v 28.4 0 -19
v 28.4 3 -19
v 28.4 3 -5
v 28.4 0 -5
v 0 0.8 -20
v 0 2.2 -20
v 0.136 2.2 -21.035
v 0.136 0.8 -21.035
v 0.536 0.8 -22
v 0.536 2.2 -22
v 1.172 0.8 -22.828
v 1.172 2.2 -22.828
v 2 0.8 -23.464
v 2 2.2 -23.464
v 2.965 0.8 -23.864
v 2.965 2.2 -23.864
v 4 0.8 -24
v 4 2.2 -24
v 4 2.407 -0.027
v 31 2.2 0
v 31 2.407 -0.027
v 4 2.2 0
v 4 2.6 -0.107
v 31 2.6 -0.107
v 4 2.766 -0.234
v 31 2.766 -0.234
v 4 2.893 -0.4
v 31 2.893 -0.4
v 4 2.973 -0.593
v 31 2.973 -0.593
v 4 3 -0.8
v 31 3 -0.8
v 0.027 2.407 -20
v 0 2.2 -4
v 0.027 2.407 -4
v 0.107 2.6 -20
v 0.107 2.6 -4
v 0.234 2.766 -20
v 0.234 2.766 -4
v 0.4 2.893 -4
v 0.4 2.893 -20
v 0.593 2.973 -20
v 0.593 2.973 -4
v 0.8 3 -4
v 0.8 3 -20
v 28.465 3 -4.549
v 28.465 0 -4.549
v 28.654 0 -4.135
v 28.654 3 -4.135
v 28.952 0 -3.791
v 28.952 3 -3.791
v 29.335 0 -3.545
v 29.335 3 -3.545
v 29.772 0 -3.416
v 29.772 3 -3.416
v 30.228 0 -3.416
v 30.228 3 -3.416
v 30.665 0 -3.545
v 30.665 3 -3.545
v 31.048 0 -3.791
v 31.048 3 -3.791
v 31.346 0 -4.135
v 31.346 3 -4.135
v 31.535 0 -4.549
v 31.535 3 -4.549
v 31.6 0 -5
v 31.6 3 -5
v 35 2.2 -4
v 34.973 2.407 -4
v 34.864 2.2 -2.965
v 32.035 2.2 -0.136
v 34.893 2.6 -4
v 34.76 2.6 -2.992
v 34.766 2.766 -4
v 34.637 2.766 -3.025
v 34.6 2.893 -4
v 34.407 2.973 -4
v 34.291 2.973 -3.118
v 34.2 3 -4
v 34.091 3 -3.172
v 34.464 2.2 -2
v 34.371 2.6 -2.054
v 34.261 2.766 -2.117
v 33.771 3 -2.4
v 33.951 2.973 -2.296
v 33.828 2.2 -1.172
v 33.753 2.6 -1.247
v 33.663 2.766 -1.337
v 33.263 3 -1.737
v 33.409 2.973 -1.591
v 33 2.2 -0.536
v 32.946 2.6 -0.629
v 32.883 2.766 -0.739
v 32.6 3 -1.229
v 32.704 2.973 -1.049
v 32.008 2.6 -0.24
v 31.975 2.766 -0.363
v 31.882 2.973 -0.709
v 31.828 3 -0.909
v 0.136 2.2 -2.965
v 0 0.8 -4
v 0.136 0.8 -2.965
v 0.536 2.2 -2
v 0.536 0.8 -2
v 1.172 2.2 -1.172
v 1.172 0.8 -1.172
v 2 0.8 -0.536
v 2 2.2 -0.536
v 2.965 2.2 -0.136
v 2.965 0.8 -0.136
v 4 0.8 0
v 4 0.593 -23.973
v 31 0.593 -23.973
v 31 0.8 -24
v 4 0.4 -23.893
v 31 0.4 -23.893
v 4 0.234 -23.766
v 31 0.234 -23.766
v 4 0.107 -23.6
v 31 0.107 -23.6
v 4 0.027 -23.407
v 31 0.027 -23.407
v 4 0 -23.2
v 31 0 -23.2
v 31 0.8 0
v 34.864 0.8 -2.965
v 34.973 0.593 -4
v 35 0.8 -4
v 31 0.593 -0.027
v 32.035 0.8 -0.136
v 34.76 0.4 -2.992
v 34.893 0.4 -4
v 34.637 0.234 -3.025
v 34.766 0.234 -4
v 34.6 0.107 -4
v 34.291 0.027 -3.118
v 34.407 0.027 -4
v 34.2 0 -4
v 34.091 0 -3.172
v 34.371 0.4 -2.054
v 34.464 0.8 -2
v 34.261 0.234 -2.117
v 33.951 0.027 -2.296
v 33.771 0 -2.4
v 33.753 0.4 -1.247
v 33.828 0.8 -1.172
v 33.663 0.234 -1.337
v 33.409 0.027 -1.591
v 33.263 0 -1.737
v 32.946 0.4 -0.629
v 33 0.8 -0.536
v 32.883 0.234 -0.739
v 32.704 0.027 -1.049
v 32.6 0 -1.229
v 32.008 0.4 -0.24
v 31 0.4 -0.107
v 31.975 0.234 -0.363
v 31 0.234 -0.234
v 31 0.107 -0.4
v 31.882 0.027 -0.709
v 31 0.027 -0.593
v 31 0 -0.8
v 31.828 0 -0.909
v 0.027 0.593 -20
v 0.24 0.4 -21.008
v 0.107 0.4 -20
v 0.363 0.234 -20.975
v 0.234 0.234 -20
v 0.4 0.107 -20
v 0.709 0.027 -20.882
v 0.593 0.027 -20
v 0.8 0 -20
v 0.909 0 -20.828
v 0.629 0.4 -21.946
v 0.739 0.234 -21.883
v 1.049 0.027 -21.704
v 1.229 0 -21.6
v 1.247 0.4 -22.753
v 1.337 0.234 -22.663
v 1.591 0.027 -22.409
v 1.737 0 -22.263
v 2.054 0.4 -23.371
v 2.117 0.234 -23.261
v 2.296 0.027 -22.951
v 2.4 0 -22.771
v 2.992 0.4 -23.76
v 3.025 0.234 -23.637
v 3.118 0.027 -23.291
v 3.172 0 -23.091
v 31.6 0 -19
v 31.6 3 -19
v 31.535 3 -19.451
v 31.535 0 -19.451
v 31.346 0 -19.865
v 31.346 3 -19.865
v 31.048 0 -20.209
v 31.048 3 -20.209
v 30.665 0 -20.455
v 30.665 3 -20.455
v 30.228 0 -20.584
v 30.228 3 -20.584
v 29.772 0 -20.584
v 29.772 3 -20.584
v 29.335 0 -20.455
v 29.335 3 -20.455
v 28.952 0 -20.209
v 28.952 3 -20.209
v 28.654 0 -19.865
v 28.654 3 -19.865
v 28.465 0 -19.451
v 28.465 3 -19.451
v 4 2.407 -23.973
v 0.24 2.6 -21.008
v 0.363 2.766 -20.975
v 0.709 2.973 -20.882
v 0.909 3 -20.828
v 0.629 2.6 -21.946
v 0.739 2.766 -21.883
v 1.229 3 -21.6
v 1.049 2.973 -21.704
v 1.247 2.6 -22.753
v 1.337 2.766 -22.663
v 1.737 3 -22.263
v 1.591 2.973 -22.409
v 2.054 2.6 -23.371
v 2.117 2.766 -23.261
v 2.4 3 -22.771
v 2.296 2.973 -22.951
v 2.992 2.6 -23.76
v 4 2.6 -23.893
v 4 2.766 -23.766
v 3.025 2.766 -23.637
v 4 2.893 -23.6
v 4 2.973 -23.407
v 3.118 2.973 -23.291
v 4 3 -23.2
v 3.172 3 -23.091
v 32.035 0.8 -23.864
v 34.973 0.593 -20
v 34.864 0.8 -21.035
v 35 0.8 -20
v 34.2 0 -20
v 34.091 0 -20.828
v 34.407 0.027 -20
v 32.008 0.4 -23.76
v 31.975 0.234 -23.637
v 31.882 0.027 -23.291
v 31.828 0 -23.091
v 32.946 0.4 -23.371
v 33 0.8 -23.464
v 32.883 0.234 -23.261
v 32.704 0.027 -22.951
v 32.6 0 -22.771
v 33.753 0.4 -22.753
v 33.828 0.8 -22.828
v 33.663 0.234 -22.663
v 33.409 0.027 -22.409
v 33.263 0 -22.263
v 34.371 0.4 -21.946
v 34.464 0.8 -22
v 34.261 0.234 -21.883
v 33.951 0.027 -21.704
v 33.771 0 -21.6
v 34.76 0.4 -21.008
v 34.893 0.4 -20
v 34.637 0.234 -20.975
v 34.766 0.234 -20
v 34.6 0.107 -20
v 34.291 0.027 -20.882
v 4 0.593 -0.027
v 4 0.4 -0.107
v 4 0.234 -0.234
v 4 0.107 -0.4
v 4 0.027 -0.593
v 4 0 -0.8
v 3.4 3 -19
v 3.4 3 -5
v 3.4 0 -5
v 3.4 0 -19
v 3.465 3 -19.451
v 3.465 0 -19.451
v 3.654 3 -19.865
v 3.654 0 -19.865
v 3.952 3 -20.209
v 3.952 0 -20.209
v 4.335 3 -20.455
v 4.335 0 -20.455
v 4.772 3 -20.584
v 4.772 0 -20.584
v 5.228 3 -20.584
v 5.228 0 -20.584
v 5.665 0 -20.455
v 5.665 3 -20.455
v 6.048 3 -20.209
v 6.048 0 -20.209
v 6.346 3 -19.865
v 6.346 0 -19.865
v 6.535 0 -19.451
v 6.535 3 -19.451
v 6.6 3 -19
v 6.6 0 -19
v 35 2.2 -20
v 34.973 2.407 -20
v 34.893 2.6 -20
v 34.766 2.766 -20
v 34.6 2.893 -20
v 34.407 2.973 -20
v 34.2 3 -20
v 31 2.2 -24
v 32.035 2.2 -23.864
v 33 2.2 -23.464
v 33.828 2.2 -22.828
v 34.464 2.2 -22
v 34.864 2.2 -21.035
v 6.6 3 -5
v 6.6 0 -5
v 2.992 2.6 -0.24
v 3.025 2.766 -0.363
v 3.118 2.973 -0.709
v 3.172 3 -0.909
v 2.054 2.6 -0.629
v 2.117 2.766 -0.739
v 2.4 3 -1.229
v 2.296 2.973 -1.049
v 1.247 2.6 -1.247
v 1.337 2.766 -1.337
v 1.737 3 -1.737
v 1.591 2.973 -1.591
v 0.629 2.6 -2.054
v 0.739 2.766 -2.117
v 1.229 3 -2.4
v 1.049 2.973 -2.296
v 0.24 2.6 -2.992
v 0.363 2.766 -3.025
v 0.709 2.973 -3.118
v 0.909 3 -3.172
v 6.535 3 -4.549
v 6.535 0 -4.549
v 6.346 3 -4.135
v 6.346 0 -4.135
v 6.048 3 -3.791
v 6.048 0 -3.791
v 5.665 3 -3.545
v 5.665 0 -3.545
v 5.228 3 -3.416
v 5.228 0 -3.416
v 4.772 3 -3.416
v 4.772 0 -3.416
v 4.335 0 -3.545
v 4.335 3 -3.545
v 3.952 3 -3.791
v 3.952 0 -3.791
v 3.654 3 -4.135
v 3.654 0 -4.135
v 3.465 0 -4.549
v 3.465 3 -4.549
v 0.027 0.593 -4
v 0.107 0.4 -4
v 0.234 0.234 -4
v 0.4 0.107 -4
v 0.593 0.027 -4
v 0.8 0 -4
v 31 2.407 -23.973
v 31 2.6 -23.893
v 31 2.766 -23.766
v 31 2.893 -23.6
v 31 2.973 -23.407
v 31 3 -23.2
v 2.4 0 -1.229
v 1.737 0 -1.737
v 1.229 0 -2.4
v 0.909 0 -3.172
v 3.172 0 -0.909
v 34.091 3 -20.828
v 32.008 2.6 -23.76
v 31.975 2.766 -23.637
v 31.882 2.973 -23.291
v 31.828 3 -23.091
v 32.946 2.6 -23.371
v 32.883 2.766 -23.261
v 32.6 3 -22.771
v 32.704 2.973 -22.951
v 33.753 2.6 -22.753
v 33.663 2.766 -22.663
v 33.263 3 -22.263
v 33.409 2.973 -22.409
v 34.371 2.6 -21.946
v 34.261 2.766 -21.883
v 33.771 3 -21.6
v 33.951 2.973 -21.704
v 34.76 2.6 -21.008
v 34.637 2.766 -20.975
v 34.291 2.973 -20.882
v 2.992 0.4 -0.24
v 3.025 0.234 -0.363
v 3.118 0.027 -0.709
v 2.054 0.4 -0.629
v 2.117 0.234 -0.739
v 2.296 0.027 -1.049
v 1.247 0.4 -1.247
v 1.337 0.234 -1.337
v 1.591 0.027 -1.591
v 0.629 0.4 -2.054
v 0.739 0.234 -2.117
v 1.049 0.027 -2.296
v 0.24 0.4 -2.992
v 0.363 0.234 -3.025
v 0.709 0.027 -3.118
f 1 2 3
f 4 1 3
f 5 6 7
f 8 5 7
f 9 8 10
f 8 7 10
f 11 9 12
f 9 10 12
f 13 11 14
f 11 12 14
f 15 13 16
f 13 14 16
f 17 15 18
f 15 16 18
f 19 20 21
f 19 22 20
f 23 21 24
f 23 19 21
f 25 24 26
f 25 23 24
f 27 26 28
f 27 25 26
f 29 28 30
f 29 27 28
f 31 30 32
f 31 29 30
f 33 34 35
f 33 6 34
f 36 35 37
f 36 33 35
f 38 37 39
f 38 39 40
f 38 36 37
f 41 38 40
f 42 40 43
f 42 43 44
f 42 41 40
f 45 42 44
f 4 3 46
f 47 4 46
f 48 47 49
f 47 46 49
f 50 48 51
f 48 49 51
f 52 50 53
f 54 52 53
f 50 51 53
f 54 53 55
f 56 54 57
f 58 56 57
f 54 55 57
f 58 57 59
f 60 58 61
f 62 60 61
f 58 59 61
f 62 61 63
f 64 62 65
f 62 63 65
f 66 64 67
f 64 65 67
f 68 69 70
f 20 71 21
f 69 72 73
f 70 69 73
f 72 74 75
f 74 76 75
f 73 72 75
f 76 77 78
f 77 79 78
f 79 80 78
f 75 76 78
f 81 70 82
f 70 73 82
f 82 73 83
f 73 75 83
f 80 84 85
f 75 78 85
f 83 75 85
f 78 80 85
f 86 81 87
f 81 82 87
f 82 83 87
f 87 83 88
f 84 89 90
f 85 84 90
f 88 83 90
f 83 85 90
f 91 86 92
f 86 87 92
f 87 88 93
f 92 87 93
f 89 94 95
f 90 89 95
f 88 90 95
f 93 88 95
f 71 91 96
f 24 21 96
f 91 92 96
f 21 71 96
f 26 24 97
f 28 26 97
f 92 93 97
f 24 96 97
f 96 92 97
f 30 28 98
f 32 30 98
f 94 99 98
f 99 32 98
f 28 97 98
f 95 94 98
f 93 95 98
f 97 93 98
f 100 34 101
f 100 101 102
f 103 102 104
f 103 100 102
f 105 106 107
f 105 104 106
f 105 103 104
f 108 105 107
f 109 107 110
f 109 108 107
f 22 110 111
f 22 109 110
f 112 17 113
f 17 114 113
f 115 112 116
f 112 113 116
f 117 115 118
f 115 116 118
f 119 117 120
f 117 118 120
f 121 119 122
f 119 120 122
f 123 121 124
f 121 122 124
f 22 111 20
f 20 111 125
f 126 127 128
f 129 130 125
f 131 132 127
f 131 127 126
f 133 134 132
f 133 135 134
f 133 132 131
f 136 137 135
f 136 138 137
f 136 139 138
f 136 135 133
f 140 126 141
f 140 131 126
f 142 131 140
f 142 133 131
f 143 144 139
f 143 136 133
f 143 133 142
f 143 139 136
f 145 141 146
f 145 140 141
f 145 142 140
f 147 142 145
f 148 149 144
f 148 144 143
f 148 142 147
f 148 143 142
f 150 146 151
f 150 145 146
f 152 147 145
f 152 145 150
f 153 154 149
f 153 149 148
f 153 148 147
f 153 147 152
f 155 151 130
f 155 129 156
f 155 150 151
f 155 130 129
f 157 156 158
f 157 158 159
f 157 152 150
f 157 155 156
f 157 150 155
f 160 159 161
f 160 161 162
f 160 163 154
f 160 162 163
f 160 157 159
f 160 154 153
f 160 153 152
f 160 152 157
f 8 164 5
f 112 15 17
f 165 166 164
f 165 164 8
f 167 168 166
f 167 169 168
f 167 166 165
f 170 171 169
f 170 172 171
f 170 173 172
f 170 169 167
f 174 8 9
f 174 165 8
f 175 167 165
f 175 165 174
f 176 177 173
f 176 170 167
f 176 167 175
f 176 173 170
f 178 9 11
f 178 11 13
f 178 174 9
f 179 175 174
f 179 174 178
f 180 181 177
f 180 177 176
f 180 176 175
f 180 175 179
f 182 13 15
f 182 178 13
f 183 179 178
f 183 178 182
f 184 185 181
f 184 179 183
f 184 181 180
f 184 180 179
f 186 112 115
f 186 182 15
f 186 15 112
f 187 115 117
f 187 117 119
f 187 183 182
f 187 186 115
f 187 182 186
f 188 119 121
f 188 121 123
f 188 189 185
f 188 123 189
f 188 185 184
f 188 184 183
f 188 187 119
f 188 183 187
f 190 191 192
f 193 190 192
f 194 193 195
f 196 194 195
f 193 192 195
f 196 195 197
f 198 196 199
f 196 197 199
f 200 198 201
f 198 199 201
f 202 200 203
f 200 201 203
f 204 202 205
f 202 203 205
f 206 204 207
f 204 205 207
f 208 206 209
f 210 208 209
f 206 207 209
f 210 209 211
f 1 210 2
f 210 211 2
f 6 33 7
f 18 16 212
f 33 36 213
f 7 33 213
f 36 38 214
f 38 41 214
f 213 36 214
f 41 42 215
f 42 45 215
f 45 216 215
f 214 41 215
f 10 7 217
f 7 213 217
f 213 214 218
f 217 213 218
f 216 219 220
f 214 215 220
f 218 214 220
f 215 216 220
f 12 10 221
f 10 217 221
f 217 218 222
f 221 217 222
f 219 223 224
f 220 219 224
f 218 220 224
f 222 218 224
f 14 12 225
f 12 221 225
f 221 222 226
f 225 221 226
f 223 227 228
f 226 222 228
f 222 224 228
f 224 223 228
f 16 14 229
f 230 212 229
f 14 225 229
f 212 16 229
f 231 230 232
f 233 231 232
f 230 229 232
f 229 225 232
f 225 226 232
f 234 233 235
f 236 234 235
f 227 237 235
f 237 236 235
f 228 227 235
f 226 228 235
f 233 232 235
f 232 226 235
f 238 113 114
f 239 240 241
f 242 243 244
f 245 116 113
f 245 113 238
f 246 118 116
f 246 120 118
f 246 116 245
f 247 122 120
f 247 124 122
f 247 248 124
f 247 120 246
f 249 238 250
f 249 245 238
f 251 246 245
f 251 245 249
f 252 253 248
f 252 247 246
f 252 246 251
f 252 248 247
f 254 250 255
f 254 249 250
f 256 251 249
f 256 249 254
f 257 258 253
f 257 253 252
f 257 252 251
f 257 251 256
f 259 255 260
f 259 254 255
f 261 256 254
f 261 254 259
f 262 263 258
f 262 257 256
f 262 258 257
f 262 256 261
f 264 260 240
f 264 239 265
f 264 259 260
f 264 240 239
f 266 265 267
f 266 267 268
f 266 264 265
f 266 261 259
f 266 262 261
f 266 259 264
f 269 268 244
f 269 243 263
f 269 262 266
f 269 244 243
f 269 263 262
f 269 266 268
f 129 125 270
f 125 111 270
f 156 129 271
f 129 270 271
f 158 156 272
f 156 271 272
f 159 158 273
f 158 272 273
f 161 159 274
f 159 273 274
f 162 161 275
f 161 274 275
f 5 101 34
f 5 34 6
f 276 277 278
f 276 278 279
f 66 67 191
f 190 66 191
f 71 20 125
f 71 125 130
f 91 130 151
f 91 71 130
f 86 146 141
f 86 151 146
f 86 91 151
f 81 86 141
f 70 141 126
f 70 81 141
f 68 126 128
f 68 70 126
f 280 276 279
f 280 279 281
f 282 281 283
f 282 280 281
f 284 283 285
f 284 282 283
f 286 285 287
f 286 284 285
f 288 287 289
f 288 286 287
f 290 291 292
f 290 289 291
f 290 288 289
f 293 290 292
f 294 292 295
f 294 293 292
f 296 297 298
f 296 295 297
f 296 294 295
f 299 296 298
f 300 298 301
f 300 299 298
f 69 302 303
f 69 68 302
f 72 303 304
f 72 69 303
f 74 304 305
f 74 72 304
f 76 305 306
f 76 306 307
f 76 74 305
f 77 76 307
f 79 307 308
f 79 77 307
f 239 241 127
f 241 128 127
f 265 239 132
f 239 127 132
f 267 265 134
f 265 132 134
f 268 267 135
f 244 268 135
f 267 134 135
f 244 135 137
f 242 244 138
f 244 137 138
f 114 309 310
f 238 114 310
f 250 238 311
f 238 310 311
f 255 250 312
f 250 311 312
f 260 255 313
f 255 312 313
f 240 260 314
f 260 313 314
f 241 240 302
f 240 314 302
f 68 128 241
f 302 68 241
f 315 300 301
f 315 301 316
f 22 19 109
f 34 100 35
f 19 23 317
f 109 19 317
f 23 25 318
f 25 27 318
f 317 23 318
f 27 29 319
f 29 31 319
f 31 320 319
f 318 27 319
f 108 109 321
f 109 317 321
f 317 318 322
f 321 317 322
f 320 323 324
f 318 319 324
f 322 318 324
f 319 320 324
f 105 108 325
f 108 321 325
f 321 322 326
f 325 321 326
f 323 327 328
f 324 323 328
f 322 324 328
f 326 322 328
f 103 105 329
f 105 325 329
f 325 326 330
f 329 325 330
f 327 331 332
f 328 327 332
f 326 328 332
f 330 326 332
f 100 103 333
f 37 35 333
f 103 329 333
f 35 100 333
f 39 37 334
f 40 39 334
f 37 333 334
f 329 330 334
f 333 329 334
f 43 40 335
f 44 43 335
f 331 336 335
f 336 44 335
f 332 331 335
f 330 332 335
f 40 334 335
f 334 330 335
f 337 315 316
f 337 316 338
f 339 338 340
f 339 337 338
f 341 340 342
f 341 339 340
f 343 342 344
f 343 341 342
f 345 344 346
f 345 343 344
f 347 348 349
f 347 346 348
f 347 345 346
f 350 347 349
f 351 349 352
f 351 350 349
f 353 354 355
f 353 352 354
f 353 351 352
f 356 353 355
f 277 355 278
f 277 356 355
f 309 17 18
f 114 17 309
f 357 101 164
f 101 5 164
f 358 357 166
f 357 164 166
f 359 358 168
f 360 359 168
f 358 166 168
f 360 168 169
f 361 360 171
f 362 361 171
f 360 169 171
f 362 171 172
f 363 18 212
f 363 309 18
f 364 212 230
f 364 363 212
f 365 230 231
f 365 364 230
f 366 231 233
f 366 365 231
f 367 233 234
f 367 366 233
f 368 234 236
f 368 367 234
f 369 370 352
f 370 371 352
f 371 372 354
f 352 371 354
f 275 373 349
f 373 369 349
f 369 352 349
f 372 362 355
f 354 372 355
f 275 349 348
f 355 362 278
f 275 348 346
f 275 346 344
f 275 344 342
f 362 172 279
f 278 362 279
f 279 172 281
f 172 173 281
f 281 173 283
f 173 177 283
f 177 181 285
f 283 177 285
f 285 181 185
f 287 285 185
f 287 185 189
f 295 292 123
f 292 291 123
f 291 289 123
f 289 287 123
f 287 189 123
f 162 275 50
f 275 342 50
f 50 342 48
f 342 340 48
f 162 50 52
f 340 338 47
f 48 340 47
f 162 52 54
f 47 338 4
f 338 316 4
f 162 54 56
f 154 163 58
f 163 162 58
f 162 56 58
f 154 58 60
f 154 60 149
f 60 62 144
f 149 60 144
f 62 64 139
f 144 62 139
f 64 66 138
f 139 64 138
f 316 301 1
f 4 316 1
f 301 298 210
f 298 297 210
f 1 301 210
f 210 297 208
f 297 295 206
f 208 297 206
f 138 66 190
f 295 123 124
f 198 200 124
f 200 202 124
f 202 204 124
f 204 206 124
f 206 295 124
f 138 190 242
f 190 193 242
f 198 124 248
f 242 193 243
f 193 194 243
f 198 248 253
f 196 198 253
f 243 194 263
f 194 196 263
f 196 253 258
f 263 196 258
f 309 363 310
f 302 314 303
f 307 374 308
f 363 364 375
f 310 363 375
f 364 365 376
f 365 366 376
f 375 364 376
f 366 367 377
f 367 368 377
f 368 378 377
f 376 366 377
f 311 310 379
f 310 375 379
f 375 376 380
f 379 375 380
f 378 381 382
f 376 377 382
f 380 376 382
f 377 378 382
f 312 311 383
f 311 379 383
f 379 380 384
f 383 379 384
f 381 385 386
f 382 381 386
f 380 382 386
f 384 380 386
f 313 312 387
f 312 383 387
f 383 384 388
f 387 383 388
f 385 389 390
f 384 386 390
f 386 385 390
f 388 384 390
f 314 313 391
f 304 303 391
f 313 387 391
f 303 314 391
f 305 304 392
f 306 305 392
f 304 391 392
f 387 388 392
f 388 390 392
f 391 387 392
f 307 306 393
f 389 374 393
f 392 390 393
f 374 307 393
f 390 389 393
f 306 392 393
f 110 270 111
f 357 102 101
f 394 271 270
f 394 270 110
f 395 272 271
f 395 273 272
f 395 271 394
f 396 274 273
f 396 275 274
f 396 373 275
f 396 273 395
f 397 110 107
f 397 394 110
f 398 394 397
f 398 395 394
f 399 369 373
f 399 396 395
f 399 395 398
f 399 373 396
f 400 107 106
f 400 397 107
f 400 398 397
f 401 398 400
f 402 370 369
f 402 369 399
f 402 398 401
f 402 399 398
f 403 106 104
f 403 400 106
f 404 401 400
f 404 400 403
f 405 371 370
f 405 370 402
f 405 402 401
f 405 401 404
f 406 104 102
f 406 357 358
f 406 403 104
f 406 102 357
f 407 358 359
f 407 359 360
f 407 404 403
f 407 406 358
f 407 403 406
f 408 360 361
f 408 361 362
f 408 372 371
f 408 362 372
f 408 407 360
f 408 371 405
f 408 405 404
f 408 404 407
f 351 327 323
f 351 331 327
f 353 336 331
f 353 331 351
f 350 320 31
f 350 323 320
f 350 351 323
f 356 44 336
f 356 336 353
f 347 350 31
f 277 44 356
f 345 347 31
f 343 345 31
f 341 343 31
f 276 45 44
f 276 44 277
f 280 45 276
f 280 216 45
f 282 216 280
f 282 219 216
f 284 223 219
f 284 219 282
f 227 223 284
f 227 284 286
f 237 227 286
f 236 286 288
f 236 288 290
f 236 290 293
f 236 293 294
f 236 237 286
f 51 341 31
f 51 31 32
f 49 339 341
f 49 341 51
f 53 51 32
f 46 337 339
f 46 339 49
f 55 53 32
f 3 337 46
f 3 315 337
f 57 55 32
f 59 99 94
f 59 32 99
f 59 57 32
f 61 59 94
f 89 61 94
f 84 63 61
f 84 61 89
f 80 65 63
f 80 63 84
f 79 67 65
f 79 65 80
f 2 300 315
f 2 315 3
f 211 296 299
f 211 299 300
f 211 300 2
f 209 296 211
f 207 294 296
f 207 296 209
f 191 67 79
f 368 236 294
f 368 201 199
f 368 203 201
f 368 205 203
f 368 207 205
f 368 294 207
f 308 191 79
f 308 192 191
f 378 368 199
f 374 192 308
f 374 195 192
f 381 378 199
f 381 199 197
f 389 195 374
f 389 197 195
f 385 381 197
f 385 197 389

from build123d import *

# Parameters (mm, degrees)
SKETCH1_W           = 35
SKETCH1_H           = 24
BOSS_EXTRUDE1_DEPTH = 3
CUT_EXTRUDE1_DEPTH  = 7
FILLET1_R           = 4
FILLET2_R           = 0.8


with BuildPart() as part:
    # Sketch1 → Boss-Extrude1 (new body)
    with BuildSketch(Plane(origin=(0, 0, 0), x_dir=(1, 0, 0), z_dir=(0, 1, 0))):
        with Locations((17.5, 12)):
            Rectangle(SKETCH1_W, SKETCH1_H)
    extrude(amount=BOSS_EXTRUDE1_DEPTH)

    # Sketch2 → Cut-Extrude1 (cut)
    with BuildSketch(Plane(origin=(0, 3, 0), x_dir=(1, 0, 0), z_dir=(0, 1, 0))):
        with BuildLine():
            Line((6.6, 19), (6.6, 5))
            ThreePointArc((6.6, 5), (5, 3.4), (3.4, 5))
            Line((3.4, 5), (3.4, 19))
            ThreePointArc((3.4, 19), (5, 20.6), (6.6, 19))
        make_face()
        with BuildLine():
            Line((28.4, 19), (28.4, 5))
            ThreePointArc((28.4, 5), (30, 3.4), (31.6, 5))
            Line((31.6, 5), (31.6, 19))
            ThreePointArc((31.6, 19), (30, 20.6), (28.4, 19))
        make_face()
    extrude(amount=-CUT_EXTRUDE1_DEPTH, mode=Mode.SUBTRACT)

    # Fillet1
    fillet1_edges = [part.edges().sort_by_distance(p)[0] for p in [
        (0, 1.5, 0),
        (0, 1.5, -24),
        (35, 1.5, -24),
        (35, 1.5, 0),
    ]]
    fillet(fillet1_edges, radius=FILLET1_R)

    # Fillet2
    fillet2_edges = [part.edges().sort_by_distance(p)[0] for p in [
        (0, 0, -12),
        (0, 3, -12),
        (17.5, 0, 0),
        (17.5, 0, -24),
        (35, 0, -12),
        (33.828427125, 0, -22.828427125),
        (33.828427125, 0, -1.171572875),
        (1.171572875, 0, -1.171572875),
        (1.171572875, 0, -22.828427125),
        (17.5, 3, -24),
        (17.5, 3, 0),
        (35, 3, -12),
        (33.828427125, 3, -22.828427125),
        (33.828427125, 3, -1.171572875),
        (1.171572875, 3, -1.171572875),
        (1.171572875, 3, -22.828427125),
    ]]
    fillet(fillet2_edges, radius=FILLET2_R)


solid = part.part
